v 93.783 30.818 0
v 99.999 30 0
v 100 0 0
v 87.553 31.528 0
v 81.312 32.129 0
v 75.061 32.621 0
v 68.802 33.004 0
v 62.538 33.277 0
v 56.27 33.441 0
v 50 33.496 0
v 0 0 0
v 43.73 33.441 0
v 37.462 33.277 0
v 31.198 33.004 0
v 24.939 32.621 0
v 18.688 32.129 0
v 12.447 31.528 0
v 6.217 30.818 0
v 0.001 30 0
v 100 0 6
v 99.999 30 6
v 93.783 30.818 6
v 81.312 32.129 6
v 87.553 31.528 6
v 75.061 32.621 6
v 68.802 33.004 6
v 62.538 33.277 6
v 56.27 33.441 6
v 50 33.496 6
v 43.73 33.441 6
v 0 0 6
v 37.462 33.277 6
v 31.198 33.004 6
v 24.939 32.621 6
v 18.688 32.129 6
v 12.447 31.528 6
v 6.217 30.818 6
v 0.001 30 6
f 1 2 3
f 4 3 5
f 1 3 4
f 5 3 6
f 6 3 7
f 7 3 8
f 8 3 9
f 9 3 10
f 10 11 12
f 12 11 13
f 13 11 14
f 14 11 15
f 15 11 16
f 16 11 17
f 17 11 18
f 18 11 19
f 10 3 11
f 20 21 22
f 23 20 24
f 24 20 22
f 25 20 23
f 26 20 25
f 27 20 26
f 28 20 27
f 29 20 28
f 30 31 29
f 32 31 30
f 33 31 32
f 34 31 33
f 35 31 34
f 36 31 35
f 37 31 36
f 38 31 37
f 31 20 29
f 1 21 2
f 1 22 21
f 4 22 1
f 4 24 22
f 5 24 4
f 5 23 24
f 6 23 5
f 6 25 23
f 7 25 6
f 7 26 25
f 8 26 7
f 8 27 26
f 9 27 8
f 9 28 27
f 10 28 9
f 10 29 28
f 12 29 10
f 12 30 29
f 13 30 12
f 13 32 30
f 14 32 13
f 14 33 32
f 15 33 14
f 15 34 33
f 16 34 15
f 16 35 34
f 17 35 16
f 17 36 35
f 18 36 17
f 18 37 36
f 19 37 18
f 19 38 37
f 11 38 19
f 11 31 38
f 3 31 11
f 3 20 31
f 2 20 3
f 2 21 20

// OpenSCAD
$fn = 32;

// ----------------------------------------------------------------------
// Arc profile plate: crown, 19 points
// ----------------------------------------------------------------------

// --- parameters (mm) ---
bar_l = 100;              // bar length, X
bar_w = 30;               // bar height at the ends, Y
arc_r = 359.26;           // radius of the crown arc
arc_angle = 16;           // crown arc angle, degrees
crown_rise = 3.5;         // rise of the crown over the ends
arc_step = 1;             // sampling step of the crown arc, degrees
plate_t = 6;              // plate thickness, Z

bbox_y = bar_w + crown_rise;  // full height with the crown

profile = [[99.999, 30], [93.783, 30.818], [87.553, 31.528], [81.312, 32.129], [75.061, 32.621], [68.802, 33.004], [62.538, 33.277], [56.27, 33.441], [50, 33.496], [43.73, 33.441], [37.462, 33.277], [31.198, 33.004], [24.939, 32.621], [18.688, 32.129], [12.447, 31.528], [6.217, 30.818], [0.001, 30], [0, 0], [100, 0]];  // primary outline, 19 points, counter clockwise

// --- the one profile operation ---
linear_extrude(height = plate_t) polygon(points = profile);
